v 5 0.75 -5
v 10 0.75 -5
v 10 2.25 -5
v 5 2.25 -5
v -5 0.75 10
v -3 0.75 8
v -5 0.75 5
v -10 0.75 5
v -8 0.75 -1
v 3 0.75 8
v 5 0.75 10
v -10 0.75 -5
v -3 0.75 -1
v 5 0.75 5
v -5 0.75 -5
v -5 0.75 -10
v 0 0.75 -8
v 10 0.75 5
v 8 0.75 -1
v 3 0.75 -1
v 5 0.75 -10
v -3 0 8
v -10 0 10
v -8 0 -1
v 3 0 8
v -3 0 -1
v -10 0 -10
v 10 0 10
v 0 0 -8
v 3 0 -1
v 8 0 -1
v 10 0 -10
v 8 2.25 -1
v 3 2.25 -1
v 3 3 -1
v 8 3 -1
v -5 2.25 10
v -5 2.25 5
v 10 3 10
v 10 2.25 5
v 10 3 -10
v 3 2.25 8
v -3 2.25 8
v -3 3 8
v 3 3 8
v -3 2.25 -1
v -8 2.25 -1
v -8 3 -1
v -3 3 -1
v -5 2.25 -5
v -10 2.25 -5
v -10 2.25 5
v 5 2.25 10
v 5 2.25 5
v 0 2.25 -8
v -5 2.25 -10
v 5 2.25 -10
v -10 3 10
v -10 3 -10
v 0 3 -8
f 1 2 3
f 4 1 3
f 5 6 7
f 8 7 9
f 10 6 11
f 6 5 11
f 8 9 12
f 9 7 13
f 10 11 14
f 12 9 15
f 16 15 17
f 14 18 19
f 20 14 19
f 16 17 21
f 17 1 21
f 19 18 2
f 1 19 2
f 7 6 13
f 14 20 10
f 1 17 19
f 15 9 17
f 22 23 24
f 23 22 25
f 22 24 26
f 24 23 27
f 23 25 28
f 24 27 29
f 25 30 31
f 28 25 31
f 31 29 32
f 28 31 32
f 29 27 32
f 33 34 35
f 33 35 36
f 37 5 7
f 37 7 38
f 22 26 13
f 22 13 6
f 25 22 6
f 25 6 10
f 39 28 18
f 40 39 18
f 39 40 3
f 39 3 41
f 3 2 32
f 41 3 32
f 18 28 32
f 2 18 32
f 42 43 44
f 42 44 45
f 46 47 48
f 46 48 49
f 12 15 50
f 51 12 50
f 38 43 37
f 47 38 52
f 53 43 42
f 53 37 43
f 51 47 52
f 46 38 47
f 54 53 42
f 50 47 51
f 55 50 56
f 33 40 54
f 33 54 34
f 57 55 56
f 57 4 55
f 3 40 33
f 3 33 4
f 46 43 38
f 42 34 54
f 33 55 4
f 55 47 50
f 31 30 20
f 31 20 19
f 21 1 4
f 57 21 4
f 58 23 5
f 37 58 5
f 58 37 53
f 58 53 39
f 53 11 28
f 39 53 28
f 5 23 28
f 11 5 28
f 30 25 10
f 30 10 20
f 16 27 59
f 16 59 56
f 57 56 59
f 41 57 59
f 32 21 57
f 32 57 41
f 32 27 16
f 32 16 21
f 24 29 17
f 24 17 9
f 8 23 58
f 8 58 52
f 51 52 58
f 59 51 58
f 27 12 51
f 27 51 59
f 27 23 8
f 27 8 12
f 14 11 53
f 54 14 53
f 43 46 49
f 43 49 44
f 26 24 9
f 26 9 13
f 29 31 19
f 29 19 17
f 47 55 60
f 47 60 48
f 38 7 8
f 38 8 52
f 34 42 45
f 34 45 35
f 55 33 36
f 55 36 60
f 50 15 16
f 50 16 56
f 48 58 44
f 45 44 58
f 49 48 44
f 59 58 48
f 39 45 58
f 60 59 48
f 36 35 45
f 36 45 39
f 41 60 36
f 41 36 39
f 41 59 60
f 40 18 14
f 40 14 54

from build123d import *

# Parameters (mm, degrees)
SKETCH1_W           = 20
SKETCH1_H           = 20
BOSS_EXTRUDE1_DEPTH = 3
SKETCH2_W           = 10
SKETCH2_H           = 1.5
CUT_EXTRUDE1_DEPTH  = 21
SKETCH3_W           = 10
SKETCH3_H           = 1.5
CUT_EXTRUDE2_DEPTH  = 21


with BuildPart() as part:
    # Sketch1 → Boss-Extrude1 (new body)
    with BuildSketch(Plane(origin=(0, 0, 0), x_dir=(1, 0, 0), z_dir=(0, 1, 0))):
        Rectangle(SKETCH1_W, SKETCH1_H)
        Polygon((-8, 1), (-3, 1), (-3, -8), (3, -8), (3, 1), (8, 1), (0, 8), align=None, mode=Mode.SUBTRACT)
    extrude(amount=BOSS_EXTRUDE1_DEPTH)

    # Sketch2 → Cut-Extrude1 (cut, through all)
    with BuildSketch(Plane.XY.offset(10)):
        with Locations((0, 1.5)):
            Rectangle(SKETCH2_W, SKETCH2_H)
    extrude(amount=-CUT_EXTRUDE1_DEPTH, mode=Mode.SUBTRACT)

    # Sketch3 → Cut-Extrude2 (cut, through all)
    with BuildSketch(Plane(origin=(10, 0, 0), x_dir=(0, 0, -1), z_dir=(1, 0, 0))):
        with Locations((0, 1.5)):
            Rectangle(SKETCH3_W, SKETCH3_H)
    extrude(amount=-CUT_EXTRUDE2_DEPTH, mode=Mode.SUBTRACT)


solid = part.part
